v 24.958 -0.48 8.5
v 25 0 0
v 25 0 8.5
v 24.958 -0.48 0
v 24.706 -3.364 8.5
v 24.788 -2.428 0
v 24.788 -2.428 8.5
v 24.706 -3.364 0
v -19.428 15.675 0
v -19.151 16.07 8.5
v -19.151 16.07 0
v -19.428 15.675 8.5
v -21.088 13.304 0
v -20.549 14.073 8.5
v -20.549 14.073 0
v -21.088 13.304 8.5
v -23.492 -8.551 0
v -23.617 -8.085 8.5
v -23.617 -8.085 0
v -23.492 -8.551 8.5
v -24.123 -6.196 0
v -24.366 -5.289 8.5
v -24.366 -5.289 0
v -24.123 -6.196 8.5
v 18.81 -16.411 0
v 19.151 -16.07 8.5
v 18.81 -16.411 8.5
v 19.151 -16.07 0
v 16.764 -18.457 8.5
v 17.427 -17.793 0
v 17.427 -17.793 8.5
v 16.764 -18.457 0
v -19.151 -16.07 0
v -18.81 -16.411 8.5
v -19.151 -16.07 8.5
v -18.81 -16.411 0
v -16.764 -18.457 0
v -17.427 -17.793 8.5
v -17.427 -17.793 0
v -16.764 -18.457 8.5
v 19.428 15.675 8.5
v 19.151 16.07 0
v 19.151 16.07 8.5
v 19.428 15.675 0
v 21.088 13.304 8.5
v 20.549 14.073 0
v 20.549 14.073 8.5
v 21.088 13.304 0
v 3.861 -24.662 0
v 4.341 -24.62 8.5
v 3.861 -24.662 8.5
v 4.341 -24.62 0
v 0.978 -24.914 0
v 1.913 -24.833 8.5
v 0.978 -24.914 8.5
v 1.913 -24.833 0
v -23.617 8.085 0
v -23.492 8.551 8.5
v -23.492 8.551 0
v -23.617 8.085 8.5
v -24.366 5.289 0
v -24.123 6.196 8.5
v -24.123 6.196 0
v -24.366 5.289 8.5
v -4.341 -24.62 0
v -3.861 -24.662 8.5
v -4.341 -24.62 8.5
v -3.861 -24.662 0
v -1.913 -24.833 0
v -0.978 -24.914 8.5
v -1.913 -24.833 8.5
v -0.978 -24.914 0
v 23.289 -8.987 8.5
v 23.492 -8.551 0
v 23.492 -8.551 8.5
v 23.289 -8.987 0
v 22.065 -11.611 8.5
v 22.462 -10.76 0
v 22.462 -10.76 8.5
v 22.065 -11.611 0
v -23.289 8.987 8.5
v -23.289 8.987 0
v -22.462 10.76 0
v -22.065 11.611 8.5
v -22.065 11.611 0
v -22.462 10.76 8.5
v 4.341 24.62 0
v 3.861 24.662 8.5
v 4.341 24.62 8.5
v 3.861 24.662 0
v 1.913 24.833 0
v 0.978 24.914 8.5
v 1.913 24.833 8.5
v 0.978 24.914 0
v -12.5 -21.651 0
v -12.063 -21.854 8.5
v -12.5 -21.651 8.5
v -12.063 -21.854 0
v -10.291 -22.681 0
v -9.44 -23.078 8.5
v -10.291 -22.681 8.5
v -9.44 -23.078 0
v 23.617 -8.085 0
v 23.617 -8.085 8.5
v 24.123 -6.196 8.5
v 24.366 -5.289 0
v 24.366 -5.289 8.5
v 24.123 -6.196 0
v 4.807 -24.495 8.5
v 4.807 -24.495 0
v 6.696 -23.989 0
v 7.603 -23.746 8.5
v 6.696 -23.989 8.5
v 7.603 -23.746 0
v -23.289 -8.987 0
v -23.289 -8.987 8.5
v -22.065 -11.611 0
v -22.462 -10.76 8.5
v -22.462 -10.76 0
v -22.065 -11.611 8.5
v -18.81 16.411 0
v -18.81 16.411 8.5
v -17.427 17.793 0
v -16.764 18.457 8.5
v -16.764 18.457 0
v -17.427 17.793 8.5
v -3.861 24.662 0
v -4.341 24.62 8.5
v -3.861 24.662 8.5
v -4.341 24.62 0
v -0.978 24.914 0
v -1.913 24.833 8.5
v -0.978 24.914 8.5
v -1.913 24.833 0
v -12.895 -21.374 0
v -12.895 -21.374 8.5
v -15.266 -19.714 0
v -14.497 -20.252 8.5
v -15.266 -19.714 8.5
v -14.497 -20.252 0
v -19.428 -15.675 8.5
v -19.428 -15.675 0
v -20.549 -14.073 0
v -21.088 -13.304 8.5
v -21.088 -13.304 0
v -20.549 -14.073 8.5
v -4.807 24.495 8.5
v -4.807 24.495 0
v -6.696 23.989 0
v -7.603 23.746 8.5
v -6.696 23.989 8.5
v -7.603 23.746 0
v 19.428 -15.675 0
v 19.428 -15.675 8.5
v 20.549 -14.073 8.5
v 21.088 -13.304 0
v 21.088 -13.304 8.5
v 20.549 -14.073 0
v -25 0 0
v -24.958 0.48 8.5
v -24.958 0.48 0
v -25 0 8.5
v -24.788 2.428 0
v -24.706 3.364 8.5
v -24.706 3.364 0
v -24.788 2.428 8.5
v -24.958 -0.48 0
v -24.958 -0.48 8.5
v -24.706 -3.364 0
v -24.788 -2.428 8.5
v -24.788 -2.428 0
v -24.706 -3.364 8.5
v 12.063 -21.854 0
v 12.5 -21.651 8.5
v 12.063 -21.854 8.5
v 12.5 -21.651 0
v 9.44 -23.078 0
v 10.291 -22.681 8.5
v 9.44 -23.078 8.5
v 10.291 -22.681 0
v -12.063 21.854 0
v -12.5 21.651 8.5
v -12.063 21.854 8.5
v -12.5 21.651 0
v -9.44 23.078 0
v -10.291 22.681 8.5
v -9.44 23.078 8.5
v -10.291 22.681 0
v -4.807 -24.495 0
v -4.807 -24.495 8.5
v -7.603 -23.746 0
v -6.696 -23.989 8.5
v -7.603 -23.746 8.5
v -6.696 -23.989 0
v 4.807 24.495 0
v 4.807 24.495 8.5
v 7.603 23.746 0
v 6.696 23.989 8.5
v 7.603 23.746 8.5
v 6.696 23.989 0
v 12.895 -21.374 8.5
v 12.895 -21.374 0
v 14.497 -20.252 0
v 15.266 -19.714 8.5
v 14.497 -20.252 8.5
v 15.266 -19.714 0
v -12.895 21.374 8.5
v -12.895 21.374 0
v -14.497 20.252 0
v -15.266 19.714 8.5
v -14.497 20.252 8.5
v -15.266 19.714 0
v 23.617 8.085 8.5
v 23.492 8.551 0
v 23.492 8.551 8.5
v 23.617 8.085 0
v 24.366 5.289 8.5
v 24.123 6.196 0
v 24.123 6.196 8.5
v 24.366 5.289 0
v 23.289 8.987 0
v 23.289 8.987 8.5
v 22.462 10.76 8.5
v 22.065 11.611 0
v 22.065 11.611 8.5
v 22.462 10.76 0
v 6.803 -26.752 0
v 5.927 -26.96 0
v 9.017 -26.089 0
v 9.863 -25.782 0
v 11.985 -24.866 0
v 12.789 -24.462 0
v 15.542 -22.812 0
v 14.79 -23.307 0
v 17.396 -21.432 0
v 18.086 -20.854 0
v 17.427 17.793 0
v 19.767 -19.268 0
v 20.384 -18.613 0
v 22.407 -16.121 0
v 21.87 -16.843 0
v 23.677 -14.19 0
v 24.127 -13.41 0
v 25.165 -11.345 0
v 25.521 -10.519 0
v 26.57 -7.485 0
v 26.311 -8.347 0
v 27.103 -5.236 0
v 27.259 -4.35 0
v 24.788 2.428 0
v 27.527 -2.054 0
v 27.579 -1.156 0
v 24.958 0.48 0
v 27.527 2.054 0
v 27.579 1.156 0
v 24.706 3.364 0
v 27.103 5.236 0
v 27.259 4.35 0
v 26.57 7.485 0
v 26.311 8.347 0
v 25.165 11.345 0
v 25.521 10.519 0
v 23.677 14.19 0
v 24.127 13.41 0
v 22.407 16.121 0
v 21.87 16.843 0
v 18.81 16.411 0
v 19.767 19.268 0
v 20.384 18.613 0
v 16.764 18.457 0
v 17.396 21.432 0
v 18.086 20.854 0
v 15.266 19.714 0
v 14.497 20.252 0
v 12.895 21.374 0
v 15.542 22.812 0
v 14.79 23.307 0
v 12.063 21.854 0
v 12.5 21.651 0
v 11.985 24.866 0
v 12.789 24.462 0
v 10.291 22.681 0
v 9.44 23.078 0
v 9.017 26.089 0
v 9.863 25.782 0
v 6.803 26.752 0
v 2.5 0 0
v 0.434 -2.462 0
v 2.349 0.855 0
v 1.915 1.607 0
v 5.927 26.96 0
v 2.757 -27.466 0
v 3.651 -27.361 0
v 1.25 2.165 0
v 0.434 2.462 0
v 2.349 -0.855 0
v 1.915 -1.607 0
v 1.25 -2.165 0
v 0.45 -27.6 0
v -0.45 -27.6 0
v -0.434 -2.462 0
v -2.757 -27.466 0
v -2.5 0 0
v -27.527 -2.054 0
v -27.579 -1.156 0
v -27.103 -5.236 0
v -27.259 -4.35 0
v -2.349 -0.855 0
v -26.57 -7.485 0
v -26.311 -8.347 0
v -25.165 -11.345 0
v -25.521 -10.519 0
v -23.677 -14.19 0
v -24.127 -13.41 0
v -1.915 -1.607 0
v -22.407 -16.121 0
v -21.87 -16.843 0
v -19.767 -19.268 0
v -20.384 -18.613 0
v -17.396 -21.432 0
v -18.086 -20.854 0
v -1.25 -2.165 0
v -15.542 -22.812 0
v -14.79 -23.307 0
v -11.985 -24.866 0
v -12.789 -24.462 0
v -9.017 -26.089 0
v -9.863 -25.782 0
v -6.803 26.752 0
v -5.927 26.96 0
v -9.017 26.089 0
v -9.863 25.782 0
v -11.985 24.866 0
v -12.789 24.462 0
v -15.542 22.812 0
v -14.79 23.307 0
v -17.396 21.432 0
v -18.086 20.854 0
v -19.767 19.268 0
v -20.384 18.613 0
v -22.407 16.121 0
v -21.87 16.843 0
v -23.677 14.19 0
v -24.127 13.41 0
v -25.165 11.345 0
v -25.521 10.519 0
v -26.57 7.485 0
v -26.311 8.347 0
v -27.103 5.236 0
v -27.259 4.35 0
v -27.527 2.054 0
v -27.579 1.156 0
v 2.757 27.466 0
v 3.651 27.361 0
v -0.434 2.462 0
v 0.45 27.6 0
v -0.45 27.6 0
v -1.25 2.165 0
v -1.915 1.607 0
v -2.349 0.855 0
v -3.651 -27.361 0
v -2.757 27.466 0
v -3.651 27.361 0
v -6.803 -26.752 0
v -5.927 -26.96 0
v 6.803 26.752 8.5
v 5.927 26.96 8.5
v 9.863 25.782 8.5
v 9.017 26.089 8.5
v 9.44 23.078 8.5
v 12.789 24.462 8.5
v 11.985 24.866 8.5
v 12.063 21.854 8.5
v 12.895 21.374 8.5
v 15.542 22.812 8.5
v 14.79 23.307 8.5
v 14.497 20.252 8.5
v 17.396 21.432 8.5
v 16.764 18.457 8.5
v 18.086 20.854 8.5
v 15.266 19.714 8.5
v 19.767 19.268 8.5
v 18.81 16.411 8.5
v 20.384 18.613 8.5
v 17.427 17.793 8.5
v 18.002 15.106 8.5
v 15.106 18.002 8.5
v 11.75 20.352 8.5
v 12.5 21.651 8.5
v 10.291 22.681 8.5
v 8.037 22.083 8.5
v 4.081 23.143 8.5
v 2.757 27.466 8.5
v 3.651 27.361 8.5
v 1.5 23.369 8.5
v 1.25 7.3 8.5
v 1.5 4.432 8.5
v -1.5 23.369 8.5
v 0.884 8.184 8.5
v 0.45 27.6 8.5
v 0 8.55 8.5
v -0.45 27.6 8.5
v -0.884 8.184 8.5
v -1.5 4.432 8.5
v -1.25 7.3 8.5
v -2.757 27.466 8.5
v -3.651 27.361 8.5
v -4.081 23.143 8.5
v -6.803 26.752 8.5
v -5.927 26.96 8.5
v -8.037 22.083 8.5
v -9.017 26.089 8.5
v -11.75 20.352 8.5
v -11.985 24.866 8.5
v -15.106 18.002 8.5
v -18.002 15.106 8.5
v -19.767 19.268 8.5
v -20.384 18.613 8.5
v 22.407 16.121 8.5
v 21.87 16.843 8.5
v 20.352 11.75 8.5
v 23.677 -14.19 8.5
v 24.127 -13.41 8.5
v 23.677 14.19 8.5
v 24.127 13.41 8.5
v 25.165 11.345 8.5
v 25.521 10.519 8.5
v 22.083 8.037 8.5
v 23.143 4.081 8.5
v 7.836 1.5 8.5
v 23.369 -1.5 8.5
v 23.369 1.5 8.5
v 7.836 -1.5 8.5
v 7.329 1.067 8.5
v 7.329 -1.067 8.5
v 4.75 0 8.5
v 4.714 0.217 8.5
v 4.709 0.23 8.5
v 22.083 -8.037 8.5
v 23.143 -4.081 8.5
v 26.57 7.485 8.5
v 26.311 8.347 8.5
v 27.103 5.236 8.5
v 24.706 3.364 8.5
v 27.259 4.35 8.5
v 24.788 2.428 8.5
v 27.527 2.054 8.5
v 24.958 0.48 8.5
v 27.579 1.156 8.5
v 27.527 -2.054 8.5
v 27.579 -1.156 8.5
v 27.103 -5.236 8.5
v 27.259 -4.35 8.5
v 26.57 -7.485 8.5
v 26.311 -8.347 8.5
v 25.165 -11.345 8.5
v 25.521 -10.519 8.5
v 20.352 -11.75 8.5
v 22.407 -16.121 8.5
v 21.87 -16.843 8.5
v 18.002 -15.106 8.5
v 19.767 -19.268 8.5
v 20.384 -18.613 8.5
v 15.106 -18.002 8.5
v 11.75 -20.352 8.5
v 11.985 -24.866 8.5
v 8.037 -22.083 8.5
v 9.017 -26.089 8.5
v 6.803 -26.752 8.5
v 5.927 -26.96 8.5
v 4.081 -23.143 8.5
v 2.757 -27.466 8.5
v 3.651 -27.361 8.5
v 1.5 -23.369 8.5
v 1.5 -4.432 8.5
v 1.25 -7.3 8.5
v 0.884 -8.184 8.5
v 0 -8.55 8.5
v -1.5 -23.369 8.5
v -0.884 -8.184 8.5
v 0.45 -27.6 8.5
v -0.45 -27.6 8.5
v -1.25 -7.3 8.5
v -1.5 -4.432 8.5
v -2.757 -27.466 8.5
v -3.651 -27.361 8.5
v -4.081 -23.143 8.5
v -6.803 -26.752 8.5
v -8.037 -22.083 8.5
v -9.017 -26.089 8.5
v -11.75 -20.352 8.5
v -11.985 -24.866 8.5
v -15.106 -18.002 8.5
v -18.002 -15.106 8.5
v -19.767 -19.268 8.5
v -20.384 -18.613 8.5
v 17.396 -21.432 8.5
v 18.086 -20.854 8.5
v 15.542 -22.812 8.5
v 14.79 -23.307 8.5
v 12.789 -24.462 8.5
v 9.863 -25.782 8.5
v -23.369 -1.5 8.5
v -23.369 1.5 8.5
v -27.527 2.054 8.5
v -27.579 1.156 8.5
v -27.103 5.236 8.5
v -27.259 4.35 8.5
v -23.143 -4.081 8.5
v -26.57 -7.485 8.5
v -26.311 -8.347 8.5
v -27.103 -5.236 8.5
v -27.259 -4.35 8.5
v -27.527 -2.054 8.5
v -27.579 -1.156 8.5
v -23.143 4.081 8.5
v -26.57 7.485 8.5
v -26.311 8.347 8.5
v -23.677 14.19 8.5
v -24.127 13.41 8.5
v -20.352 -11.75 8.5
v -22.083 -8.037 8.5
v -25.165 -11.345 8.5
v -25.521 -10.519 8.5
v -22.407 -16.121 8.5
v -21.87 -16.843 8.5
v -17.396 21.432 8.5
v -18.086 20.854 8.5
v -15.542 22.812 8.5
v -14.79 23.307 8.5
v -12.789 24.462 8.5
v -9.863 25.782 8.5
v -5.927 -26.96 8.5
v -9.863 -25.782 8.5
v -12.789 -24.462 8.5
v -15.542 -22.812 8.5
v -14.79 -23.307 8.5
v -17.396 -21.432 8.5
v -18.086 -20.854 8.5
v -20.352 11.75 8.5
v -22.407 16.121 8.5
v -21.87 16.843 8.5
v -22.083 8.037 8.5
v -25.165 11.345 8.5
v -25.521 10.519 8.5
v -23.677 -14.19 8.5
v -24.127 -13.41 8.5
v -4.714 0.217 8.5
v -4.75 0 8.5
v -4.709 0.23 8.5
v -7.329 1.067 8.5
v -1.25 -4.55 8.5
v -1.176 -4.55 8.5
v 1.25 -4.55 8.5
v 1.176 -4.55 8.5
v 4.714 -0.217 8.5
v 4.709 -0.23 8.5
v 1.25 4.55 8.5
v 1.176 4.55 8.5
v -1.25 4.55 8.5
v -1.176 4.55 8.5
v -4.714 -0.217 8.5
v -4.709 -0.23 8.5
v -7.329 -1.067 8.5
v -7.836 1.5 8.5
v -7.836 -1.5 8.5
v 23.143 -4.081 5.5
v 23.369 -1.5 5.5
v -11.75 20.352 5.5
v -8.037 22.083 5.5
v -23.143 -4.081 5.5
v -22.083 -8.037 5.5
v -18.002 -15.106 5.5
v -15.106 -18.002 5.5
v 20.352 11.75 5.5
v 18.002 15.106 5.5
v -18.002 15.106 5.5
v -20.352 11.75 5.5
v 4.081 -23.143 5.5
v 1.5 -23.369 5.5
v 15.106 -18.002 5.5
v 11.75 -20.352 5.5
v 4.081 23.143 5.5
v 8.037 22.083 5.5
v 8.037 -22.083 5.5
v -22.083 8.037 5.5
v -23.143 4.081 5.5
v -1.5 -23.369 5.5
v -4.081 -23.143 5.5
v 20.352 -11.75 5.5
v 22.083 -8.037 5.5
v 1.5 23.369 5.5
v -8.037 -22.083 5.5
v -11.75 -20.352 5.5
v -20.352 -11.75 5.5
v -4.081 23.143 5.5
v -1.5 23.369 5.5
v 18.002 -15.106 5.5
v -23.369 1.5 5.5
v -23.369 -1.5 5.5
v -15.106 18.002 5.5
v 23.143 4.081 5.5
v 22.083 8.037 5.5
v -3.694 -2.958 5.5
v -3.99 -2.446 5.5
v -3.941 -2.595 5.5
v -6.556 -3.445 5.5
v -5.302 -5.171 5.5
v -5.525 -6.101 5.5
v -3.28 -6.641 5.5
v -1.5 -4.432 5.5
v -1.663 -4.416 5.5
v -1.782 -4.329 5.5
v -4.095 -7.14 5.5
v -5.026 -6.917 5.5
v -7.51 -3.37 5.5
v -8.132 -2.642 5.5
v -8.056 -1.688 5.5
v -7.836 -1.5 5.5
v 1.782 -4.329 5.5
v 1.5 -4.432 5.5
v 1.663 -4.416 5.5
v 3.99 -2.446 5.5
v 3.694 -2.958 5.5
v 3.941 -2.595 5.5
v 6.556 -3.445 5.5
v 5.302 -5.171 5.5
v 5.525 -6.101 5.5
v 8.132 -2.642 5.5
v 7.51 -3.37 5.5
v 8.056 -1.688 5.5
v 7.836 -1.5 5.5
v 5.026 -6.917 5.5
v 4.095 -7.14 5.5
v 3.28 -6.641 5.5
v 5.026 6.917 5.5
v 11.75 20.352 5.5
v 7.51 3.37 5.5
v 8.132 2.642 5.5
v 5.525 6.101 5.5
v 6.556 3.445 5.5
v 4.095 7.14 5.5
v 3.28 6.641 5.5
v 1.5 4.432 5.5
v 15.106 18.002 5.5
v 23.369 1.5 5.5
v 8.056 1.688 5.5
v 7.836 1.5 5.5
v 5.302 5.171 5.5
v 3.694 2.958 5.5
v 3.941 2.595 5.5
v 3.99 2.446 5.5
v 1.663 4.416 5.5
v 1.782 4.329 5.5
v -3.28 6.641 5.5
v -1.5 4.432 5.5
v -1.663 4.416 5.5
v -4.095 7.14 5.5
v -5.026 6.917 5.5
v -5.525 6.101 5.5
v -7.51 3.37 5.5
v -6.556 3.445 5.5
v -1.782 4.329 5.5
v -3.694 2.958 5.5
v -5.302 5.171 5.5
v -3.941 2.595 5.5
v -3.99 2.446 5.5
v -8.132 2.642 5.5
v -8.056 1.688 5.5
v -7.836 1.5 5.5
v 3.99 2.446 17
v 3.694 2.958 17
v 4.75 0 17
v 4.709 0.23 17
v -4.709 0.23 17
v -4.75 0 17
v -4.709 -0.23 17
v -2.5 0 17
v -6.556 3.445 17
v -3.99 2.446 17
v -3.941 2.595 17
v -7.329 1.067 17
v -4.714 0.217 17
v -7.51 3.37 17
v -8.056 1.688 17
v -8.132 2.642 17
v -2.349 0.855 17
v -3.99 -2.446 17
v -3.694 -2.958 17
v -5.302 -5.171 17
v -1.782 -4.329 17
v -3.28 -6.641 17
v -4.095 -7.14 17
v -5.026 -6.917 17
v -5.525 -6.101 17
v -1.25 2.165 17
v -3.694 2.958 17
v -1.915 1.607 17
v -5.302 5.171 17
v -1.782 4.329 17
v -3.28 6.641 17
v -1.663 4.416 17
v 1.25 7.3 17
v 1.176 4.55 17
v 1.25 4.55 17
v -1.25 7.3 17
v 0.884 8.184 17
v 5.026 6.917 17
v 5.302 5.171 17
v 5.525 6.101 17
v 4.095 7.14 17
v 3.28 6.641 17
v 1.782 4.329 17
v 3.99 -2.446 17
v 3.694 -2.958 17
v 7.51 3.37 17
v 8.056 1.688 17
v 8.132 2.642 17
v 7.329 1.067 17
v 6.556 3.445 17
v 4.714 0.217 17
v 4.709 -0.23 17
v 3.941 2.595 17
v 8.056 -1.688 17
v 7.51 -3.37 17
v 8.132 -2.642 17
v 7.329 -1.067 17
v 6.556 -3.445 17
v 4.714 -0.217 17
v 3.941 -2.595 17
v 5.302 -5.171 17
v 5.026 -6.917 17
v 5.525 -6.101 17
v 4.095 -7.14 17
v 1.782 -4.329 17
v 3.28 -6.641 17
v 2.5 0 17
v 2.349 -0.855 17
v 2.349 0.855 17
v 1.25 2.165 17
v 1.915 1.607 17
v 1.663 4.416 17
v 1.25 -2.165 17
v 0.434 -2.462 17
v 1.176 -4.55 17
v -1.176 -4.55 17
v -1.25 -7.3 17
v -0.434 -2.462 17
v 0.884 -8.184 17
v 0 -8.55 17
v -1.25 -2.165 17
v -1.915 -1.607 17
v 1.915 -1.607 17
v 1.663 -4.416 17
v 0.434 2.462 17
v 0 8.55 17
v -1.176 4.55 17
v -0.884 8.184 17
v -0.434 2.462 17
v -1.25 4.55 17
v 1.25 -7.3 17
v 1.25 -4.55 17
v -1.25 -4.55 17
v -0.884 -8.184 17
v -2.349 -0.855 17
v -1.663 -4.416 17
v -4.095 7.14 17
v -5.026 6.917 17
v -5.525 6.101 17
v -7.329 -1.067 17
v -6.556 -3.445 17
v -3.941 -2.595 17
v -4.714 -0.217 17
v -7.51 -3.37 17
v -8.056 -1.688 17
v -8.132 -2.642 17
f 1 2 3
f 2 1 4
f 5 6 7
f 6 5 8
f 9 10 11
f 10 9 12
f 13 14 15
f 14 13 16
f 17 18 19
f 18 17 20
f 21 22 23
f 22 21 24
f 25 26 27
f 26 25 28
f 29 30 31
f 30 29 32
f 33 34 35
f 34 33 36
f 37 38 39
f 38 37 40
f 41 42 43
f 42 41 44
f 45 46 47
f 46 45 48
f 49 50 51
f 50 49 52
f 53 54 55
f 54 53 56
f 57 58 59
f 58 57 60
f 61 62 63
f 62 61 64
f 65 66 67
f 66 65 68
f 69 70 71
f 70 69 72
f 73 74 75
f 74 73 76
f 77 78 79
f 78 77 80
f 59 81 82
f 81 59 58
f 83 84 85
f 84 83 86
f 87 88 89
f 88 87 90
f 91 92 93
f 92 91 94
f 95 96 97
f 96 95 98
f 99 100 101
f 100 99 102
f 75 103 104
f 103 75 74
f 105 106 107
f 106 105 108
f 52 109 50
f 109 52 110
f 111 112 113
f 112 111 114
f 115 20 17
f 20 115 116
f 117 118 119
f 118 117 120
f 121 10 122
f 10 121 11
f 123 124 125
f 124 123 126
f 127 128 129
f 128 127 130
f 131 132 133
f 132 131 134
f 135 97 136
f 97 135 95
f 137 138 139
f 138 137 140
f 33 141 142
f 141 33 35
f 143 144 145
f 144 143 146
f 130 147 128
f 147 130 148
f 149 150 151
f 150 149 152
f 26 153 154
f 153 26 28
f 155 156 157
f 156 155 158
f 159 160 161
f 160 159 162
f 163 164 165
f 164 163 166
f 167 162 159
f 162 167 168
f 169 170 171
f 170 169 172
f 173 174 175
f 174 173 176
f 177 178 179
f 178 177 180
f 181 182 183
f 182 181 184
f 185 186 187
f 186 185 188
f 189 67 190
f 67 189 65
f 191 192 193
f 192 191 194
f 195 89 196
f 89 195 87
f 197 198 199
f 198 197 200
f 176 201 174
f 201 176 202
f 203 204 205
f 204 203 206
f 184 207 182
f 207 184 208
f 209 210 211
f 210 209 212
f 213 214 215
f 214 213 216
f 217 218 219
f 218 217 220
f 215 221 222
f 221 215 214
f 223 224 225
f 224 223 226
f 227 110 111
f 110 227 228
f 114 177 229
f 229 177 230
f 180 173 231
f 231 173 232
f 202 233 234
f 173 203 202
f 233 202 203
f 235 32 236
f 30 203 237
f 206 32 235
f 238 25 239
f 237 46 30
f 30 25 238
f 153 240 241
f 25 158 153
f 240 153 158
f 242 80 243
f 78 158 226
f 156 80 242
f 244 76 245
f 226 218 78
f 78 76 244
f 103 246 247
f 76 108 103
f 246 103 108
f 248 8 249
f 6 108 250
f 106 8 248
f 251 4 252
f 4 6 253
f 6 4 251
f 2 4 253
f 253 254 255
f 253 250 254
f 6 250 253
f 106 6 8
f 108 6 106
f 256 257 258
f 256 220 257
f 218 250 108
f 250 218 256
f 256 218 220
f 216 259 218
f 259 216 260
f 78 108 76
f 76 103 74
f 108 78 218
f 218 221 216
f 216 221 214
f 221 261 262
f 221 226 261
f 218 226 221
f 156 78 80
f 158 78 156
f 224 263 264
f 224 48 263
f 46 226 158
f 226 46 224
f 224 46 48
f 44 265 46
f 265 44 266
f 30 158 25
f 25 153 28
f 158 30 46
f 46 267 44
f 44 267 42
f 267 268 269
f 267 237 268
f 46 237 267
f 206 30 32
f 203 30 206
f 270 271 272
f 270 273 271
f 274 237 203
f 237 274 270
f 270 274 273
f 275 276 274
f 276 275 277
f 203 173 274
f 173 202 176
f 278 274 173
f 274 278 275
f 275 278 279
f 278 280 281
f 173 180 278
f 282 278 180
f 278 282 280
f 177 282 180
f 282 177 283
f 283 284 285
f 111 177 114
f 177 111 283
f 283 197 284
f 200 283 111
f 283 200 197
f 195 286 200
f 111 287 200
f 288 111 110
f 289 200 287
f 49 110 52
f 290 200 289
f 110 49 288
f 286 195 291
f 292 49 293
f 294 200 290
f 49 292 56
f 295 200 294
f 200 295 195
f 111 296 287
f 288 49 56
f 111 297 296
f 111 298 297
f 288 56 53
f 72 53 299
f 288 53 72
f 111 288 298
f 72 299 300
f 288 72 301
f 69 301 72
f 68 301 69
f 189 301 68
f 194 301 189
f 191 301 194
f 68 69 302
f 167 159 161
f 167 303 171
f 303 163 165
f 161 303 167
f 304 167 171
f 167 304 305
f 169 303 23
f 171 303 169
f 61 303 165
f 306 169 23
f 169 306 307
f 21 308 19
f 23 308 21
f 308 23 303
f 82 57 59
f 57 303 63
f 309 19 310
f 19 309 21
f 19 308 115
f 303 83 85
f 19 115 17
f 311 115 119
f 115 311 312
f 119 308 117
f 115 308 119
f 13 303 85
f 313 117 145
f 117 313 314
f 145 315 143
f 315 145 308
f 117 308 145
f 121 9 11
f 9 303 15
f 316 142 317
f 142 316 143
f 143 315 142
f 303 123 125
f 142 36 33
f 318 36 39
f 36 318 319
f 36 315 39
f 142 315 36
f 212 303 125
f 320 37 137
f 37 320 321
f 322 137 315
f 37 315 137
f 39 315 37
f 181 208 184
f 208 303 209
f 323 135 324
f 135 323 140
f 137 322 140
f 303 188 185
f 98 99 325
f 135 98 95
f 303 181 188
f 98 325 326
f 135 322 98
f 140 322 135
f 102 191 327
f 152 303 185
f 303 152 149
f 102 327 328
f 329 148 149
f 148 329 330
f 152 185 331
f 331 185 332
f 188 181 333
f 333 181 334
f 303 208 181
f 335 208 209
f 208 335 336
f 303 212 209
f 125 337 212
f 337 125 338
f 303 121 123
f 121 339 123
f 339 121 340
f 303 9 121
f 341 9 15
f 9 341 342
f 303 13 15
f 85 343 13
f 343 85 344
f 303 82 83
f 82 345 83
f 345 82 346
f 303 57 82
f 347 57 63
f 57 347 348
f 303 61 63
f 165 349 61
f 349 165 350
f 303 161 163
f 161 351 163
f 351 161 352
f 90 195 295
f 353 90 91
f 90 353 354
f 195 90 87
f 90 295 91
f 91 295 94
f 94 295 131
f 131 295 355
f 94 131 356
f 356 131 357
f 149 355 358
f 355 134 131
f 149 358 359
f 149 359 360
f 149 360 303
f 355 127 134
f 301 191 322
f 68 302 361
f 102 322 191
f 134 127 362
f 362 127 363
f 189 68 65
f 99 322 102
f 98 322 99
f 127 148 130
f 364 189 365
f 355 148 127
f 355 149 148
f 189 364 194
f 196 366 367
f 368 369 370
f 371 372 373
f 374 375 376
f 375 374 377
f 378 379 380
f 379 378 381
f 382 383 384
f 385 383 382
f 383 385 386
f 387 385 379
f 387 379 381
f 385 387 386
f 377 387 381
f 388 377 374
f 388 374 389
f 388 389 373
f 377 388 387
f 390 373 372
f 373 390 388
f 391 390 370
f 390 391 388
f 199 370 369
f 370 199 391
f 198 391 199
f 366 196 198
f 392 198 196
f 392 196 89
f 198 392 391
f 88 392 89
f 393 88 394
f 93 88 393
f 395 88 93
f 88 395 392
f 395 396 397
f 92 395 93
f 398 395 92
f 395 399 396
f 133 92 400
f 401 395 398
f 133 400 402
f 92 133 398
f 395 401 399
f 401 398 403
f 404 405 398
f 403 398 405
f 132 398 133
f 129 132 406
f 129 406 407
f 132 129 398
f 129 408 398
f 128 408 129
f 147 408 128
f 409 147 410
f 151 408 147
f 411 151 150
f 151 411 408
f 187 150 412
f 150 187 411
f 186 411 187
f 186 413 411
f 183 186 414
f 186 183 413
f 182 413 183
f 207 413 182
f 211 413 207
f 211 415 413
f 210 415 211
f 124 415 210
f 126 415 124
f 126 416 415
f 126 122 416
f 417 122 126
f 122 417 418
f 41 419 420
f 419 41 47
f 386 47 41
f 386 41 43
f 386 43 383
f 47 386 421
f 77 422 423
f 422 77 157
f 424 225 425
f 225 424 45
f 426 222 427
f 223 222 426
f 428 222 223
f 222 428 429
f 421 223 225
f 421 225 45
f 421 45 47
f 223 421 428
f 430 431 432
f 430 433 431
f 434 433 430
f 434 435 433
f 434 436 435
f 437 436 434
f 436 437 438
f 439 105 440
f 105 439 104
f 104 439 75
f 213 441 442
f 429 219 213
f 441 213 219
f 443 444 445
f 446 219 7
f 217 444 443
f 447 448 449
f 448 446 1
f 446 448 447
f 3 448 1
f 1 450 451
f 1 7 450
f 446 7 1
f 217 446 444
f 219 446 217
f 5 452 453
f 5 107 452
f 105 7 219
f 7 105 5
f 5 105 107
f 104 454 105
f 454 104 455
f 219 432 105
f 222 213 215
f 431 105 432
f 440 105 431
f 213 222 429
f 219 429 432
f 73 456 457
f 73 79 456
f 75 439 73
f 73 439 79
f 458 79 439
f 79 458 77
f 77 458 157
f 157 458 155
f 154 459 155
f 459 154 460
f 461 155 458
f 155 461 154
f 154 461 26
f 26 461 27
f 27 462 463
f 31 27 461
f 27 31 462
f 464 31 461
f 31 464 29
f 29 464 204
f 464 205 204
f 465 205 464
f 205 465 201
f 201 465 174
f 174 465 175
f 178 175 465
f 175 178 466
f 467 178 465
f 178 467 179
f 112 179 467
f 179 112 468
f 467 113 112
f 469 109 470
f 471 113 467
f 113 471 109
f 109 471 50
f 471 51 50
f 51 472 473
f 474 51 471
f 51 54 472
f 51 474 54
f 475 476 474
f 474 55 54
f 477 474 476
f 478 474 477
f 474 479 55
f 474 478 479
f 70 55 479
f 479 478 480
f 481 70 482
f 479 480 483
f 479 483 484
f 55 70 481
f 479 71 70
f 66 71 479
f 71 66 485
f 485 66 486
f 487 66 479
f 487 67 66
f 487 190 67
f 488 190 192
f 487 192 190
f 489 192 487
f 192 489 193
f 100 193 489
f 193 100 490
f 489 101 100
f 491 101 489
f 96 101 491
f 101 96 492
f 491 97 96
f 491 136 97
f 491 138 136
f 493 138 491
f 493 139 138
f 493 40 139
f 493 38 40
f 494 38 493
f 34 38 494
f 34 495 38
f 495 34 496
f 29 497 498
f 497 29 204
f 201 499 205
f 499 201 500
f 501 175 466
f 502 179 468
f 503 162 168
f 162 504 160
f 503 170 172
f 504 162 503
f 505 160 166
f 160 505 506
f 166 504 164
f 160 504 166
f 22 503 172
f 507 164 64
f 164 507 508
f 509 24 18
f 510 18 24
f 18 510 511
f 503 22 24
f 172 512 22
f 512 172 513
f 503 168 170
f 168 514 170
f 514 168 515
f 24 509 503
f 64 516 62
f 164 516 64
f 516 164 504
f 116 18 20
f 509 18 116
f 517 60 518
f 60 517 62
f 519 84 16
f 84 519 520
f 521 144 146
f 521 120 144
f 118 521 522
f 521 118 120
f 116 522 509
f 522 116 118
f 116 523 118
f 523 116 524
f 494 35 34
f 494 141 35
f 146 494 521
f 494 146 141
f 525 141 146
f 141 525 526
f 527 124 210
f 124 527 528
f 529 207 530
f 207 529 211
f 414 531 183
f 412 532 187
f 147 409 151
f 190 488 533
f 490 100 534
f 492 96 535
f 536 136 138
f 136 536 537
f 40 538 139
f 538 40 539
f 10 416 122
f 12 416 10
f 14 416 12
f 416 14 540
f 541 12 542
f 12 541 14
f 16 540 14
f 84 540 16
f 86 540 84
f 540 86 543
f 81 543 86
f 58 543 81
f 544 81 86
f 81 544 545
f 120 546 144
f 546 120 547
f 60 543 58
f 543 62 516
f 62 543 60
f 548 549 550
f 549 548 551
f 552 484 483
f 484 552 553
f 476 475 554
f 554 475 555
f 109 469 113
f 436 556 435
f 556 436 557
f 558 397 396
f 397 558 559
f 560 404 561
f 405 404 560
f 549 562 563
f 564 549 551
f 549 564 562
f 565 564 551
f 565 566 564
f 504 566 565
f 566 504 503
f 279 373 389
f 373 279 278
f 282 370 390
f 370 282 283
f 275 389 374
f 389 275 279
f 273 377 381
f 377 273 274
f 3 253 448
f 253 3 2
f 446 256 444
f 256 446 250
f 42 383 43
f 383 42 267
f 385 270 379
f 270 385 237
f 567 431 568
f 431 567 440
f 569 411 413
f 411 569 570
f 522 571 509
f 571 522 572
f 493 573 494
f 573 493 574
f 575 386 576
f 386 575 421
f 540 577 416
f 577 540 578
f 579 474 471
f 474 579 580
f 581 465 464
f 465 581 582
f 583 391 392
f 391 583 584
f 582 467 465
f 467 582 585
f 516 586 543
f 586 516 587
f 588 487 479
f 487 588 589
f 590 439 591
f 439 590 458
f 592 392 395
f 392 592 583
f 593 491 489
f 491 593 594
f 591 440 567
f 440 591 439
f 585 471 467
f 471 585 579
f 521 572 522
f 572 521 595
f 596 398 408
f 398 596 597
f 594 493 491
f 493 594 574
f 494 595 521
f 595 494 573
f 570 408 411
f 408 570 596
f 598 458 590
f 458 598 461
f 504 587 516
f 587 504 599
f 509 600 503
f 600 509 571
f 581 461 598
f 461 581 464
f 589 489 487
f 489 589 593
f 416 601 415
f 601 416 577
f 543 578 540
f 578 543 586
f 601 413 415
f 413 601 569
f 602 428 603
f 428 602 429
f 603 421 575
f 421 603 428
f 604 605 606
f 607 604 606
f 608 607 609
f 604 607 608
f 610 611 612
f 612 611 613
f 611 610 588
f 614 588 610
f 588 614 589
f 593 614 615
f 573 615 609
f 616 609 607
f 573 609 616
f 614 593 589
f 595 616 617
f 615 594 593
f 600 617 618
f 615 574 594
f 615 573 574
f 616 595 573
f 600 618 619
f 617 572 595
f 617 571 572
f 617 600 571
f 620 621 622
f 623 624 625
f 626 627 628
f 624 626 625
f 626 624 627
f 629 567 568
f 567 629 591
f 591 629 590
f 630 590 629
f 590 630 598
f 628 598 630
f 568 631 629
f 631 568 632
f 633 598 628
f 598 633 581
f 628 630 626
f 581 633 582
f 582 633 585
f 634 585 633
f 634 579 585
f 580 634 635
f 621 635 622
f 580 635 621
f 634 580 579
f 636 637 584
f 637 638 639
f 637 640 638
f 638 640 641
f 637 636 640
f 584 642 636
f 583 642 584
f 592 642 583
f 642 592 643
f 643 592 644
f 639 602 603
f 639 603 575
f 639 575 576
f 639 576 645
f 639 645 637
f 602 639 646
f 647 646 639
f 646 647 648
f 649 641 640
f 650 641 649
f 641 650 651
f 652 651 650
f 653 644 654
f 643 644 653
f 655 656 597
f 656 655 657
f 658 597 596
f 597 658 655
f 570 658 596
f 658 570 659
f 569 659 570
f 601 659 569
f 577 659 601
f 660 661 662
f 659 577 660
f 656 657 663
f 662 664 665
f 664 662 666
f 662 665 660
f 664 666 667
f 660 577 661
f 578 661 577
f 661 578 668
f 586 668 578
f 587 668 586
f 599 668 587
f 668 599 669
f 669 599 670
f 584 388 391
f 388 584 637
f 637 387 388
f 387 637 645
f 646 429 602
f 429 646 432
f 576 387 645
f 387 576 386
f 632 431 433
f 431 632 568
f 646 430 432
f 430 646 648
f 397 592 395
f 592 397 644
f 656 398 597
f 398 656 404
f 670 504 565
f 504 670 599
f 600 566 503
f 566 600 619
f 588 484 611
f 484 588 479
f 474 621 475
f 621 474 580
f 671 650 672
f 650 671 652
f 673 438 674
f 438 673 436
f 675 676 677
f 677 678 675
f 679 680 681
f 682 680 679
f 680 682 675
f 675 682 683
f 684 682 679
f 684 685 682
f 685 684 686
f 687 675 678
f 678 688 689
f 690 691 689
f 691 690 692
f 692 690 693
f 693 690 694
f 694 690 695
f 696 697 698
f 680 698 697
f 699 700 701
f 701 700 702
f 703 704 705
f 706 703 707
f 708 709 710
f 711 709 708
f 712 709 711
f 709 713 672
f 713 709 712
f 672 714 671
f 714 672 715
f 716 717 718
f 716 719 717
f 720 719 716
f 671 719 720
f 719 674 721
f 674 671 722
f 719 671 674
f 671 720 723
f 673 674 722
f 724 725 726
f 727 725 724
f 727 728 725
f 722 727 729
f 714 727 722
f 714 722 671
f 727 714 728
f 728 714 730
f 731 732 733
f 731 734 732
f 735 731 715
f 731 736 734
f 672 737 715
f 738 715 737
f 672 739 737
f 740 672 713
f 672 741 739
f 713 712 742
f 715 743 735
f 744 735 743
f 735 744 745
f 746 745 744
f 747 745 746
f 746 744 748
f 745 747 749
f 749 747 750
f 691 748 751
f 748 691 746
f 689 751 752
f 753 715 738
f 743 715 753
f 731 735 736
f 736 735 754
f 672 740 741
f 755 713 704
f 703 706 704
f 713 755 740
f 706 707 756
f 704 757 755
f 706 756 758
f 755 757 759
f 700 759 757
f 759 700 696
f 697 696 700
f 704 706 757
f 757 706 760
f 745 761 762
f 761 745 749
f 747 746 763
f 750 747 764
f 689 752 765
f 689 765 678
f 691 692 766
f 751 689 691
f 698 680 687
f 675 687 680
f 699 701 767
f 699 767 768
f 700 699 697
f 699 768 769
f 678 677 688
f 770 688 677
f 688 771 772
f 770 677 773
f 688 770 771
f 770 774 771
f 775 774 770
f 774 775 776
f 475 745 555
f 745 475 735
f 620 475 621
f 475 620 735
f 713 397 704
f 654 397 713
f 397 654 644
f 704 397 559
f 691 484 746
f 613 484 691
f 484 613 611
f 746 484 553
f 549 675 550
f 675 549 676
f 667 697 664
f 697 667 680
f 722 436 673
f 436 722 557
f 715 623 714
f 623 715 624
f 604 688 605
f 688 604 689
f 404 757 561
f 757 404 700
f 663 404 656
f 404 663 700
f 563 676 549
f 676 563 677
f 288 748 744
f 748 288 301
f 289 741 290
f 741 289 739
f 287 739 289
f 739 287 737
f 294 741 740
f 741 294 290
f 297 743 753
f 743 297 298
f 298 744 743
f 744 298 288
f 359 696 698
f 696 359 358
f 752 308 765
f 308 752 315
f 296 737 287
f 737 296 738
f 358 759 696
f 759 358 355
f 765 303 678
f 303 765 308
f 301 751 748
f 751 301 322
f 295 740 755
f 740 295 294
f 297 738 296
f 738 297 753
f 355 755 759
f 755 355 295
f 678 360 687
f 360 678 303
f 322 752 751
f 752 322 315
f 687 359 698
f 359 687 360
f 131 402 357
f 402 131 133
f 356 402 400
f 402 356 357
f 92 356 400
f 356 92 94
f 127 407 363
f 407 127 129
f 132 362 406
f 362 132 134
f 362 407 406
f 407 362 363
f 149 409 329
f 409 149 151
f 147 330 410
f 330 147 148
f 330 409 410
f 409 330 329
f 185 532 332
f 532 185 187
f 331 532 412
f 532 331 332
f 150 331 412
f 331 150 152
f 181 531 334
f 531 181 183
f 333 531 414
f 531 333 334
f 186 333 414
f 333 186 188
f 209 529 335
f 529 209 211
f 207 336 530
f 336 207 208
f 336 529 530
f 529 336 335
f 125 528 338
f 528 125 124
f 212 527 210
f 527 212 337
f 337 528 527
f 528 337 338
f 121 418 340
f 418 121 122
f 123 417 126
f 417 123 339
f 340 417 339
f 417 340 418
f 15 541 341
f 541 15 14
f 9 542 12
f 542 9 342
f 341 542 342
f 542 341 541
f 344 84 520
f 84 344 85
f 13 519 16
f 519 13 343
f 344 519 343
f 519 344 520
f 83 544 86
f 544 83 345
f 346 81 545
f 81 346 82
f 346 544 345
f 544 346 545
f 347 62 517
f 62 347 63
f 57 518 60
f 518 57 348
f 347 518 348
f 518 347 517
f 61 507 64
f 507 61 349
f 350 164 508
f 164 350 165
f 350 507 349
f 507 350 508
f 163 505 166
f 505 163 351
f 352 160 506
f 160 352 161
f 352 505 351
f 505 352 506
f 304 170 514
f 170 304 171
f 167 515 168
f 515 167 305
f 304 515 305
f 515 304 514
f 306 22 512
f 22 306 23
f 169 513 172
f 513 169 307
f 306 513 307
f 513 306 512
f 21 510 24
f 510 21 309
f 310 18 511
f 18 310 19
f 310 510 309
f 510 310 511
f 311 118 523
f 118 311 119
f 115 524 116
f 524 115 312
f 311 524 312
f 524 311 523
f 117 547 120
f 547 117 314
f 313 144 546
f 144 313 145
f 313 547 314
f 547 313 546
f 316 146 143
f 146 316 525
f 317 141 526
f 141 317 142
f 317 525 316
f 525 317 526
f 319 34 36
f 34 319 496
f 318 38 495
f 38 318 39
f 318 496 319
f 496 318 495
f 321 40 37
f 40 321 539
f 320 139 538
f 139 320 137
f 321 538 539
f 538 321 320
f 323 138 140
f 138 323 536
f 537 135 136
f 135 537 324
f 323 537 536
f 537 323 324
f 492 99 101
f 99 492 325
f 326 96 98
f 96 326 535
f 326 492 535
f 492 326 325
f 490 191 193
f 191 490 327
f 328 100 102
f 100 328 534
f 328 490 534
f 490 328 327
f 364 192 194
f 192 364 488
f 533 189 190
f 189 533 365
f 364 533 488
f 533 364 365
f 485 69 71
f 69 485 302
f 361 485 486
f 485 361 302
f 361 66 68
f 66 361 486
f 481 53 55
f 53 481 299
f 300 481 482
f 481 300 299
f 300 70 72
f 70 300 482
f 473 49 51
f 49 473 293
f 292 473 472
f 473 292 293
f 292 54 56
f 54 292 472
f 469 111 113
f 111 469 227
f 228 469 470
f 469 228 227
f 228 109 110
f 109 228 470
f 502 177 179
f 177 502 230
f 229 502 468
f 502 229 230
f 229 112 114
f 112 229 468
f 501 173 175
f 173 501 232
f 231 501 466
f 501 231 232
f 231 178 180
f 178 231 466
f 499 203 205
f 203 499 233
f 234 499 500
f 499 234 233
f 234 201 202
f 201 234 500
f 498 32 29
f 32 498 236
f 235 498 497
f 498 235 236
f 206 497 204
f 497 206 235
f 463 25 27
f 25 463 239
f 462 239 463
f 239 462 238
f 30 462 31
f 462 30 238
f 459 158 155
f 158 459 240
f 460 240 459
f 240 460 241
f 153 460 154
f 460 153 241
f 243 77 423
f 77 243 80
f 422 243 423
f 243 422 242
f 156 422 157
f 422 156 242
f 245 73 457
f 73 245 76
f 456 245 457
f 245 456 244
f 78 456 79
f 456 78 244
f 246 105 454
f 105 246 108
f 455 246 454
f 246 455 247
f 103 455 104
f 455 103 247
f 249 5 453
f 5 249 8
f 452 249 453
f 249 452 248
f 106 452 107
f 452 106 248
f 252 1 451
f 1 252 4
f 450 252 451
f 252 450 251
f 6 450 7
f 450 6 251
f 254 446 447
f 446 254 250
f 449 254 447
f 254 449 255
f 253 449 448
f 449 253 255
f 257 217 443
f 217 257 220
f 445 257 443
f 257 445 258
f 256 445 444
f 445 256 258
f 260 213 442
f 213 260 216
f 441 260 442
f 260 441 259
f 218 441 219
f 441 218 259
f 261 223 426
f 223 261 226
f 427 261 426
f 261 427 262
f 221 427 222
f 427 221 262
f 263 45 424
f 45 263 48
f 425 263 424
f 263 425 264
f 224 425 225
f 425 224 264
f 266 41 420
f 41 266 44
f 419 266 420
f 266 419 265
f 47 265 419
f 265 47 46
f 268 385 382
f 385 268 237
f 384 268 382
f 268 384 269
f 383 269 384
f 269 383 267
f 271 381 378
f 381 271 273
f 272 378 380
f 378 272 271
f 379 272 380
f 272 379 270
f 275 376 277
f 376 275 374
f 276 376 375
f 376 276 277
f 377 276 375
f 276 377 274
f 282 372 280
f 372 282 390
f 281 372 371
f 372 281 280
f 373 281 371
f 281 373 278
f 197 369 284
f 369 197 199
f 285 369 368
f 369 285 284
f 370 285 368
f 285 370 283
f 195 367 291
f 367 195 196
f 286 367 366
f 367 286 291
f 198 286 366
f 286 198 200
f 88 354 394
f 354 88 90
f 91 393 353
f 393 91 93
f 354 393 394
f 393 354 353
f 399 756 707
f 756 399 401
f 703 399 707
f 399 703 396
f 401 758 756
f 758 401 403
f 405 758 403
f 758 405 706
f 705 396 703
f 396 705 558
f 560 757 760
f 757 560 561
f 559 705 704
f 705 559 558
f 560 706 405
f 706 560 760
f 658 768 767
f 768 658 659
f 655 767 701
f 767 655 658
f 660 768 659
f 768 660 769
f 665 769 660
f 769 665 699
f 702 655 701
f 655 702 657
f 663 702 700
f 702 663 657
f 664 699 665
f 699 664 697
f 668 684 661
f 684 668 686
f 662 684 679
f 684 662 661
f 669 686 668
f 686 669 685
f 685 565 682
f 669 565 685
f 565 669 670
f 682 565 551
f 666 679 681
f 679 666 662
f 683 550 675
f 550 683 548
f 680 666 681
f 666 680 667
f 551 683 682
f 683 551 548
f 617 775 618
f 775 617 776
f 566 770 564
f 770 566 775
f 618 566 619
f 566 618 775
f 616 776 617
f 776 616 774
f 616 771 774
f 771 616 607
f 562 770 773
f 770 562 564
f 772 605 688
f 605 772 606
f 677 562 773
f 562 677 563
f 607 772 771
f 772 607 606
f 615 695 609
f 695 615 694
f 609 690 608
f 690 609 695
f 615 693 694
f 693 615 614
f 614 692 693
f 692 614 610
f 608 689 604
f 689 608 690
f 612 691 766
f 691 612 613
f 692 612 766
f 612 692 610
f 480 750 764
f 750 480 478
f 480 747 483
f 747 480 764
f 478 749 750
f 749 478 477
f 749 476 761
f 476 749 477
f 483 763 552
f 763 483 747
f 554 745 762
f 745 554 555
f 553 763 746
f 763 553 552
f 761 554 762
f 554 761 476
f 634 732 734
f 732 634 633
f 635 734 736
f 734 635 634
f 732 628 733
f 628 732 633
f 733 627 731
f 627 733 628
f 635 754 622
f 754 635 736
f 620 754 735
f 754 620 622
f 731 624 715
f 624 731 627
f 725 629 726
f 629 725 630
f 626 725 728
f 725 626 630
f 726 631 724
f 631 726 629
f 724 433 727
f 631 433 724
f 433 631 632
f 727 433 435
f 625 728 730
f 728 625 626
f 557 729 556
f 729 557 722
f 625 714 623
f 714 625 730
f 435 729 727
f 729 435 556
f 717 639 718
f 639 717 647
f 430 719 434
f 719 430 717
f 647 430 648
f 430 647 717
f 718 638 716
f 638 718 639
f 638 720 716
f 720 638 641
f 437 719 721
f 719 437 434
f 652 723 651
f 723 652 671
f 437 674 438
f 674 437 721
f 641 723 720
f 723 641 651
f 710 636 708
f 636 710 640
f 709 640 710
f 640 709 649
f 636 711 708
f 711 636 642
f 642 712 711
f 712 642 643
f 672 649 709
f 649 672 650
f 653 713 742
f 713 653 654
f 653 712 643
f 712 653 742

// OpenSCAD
BASE_DIAMETER = 50;
BASE_SIZE_Z = 8.5;

BASE_SUPPORT_THICKNESS = 3;

BASE_INSET_DIAMETER = 47;
BASE_INSET_SIZE_Z = 3;

BASE_TOOTH_SIZE_Y = 2.8;
BASE_TOOTH_SIZE_X_BOTTOM = 2;
BASE_TOOTH_SIZE_X_TOP = 0.9;
BASE_TEETH_NUMBER = 54;

INNER_TOOTH_SIZE_Y = 4;
INNER_TOOTH_SIZE_X_BOTTOM = 2.5;
INNER_TOOTH_SIZE_X_TOP = 2.5;
INNER_TEETH_NUMBER = 10;

CENTER_CYL_OUTER_DIAMETER = 9.5;
CENTER_CYL_INNER_DIAMETER = 5;
CENTER_CYL_SIZE_Z = 17;

module support() {
    linear_extrude(BASE_SIZE_Z) {
        square(size = [BASE_SUPPORT_THICKNESS, BASE_DIAMETER - 0.5], center = true);
        rotate([0, 0, 90])
            square(size = [BASE_SUPPORT_THICKNESS, BASE_DIAMETER - 0.5], center = true);
    }
}

module inset() {
    linear_extrude(BASE_INSET_SIZE_Z * 2) {
        circle(r = BASE_INSET_DIAMETER / 2, $fn = 36);
    }
}

module base() {
    linear_extrude(BASE_SIZE_Z) {
        circle(r = BASE_DIAMETER / 2, $fn = 36);
    }
}

module tooth(SIZE_X_BOTTOM, SIZE_X_TOP, SIZE_Y, SIZE_Z) {
    linear_extrude(SIZE_Z) {
        x1 = SIZE_X_BOTTOM / 2;
        x2 = 0 - x1;
        x3 = SIZE_X_TOP / 2;
        x4 = 0 - x3;
        y1 = 0;
        y2 = SIZE_Y;
        polygon([
            [x1, y1],
            [x2, y1],
            [x4, y2],
            [x3, y2]
        ]);
    }
}

module teeth(NUMBER, DISTANCE) {
    step = 360 / NUMBER;
    for (i = [0:NUMBER]) {
        rotate([0, 0, i * step])
            translate([0, DISTANCE, 0])
                children();
    }
}

module inner_tooth() {
    translate([0, INNER_TOOTH_SIZE_Y - INNER_TOOTH_SIZE_X_TOP / 2, 0]) cylinder(r=INNER_TOOTH_SIZE_X_TOP / 2, h=CENTER_CYL_SIZE_Z, $fn=8);
    tooth(
        INNER_TOOTH_SIZE_X_BOTTOM,
        INNER_TOOTH_SIZE_X_TOP,
        INNER_TOOTH_SIZE_Y - INNER_TOOTH_SIZE_X_TOP / 2,
        CENTER_CYL_SIZE_Z
    );
}

module base_teeth() {
    teeth(BASE_TEETH_NUMBER, BASE_DIAMETER / 2 - 0.2) {
        tooth(
            BASE_TOOTH_SIZE_X_BOTTOM,
            BASE_TOOTH_SIZE_X_TOP,
            BASE_TOOTH_SIZE_Y,
            BASE_SIZE_Z
        );
    }
}

module inner_teeth() {
    teeth(INNER_TEETH_NUMBER, CENTER_CYL_OUTER_DIAMETER / 2 - 0.2) {
        inner_tooth();
    }
}

module center_cyl() {
    cylinder(r=CENTER_CYL_OUTER_DIAMETER / 2, h=CENTER_CYL_SIZE_Z, $fn=18);
}

module assembly() {
    difference() {
        union() {
            difference() {
                base();
                translate([0, 0, BASE_SIZE_Z - BASE_INSET_SIZE_Z])
                    inset();
            }
            support();
            cylinder(r=CENTER_CYL_OUTER_DIAMETER / 2, h=CENTER_CYL_SIZE_Z, $fn=18);
        }
        translate([0, 0, -1])
            cylinder(r=CENTER_CYL_INNER_DIAMETER / 2, h=CENTER_CYL_SIZE_Z + 2, $fn=18);
    }
    base_teeth();
    inner_teeth();
}

assembly();
